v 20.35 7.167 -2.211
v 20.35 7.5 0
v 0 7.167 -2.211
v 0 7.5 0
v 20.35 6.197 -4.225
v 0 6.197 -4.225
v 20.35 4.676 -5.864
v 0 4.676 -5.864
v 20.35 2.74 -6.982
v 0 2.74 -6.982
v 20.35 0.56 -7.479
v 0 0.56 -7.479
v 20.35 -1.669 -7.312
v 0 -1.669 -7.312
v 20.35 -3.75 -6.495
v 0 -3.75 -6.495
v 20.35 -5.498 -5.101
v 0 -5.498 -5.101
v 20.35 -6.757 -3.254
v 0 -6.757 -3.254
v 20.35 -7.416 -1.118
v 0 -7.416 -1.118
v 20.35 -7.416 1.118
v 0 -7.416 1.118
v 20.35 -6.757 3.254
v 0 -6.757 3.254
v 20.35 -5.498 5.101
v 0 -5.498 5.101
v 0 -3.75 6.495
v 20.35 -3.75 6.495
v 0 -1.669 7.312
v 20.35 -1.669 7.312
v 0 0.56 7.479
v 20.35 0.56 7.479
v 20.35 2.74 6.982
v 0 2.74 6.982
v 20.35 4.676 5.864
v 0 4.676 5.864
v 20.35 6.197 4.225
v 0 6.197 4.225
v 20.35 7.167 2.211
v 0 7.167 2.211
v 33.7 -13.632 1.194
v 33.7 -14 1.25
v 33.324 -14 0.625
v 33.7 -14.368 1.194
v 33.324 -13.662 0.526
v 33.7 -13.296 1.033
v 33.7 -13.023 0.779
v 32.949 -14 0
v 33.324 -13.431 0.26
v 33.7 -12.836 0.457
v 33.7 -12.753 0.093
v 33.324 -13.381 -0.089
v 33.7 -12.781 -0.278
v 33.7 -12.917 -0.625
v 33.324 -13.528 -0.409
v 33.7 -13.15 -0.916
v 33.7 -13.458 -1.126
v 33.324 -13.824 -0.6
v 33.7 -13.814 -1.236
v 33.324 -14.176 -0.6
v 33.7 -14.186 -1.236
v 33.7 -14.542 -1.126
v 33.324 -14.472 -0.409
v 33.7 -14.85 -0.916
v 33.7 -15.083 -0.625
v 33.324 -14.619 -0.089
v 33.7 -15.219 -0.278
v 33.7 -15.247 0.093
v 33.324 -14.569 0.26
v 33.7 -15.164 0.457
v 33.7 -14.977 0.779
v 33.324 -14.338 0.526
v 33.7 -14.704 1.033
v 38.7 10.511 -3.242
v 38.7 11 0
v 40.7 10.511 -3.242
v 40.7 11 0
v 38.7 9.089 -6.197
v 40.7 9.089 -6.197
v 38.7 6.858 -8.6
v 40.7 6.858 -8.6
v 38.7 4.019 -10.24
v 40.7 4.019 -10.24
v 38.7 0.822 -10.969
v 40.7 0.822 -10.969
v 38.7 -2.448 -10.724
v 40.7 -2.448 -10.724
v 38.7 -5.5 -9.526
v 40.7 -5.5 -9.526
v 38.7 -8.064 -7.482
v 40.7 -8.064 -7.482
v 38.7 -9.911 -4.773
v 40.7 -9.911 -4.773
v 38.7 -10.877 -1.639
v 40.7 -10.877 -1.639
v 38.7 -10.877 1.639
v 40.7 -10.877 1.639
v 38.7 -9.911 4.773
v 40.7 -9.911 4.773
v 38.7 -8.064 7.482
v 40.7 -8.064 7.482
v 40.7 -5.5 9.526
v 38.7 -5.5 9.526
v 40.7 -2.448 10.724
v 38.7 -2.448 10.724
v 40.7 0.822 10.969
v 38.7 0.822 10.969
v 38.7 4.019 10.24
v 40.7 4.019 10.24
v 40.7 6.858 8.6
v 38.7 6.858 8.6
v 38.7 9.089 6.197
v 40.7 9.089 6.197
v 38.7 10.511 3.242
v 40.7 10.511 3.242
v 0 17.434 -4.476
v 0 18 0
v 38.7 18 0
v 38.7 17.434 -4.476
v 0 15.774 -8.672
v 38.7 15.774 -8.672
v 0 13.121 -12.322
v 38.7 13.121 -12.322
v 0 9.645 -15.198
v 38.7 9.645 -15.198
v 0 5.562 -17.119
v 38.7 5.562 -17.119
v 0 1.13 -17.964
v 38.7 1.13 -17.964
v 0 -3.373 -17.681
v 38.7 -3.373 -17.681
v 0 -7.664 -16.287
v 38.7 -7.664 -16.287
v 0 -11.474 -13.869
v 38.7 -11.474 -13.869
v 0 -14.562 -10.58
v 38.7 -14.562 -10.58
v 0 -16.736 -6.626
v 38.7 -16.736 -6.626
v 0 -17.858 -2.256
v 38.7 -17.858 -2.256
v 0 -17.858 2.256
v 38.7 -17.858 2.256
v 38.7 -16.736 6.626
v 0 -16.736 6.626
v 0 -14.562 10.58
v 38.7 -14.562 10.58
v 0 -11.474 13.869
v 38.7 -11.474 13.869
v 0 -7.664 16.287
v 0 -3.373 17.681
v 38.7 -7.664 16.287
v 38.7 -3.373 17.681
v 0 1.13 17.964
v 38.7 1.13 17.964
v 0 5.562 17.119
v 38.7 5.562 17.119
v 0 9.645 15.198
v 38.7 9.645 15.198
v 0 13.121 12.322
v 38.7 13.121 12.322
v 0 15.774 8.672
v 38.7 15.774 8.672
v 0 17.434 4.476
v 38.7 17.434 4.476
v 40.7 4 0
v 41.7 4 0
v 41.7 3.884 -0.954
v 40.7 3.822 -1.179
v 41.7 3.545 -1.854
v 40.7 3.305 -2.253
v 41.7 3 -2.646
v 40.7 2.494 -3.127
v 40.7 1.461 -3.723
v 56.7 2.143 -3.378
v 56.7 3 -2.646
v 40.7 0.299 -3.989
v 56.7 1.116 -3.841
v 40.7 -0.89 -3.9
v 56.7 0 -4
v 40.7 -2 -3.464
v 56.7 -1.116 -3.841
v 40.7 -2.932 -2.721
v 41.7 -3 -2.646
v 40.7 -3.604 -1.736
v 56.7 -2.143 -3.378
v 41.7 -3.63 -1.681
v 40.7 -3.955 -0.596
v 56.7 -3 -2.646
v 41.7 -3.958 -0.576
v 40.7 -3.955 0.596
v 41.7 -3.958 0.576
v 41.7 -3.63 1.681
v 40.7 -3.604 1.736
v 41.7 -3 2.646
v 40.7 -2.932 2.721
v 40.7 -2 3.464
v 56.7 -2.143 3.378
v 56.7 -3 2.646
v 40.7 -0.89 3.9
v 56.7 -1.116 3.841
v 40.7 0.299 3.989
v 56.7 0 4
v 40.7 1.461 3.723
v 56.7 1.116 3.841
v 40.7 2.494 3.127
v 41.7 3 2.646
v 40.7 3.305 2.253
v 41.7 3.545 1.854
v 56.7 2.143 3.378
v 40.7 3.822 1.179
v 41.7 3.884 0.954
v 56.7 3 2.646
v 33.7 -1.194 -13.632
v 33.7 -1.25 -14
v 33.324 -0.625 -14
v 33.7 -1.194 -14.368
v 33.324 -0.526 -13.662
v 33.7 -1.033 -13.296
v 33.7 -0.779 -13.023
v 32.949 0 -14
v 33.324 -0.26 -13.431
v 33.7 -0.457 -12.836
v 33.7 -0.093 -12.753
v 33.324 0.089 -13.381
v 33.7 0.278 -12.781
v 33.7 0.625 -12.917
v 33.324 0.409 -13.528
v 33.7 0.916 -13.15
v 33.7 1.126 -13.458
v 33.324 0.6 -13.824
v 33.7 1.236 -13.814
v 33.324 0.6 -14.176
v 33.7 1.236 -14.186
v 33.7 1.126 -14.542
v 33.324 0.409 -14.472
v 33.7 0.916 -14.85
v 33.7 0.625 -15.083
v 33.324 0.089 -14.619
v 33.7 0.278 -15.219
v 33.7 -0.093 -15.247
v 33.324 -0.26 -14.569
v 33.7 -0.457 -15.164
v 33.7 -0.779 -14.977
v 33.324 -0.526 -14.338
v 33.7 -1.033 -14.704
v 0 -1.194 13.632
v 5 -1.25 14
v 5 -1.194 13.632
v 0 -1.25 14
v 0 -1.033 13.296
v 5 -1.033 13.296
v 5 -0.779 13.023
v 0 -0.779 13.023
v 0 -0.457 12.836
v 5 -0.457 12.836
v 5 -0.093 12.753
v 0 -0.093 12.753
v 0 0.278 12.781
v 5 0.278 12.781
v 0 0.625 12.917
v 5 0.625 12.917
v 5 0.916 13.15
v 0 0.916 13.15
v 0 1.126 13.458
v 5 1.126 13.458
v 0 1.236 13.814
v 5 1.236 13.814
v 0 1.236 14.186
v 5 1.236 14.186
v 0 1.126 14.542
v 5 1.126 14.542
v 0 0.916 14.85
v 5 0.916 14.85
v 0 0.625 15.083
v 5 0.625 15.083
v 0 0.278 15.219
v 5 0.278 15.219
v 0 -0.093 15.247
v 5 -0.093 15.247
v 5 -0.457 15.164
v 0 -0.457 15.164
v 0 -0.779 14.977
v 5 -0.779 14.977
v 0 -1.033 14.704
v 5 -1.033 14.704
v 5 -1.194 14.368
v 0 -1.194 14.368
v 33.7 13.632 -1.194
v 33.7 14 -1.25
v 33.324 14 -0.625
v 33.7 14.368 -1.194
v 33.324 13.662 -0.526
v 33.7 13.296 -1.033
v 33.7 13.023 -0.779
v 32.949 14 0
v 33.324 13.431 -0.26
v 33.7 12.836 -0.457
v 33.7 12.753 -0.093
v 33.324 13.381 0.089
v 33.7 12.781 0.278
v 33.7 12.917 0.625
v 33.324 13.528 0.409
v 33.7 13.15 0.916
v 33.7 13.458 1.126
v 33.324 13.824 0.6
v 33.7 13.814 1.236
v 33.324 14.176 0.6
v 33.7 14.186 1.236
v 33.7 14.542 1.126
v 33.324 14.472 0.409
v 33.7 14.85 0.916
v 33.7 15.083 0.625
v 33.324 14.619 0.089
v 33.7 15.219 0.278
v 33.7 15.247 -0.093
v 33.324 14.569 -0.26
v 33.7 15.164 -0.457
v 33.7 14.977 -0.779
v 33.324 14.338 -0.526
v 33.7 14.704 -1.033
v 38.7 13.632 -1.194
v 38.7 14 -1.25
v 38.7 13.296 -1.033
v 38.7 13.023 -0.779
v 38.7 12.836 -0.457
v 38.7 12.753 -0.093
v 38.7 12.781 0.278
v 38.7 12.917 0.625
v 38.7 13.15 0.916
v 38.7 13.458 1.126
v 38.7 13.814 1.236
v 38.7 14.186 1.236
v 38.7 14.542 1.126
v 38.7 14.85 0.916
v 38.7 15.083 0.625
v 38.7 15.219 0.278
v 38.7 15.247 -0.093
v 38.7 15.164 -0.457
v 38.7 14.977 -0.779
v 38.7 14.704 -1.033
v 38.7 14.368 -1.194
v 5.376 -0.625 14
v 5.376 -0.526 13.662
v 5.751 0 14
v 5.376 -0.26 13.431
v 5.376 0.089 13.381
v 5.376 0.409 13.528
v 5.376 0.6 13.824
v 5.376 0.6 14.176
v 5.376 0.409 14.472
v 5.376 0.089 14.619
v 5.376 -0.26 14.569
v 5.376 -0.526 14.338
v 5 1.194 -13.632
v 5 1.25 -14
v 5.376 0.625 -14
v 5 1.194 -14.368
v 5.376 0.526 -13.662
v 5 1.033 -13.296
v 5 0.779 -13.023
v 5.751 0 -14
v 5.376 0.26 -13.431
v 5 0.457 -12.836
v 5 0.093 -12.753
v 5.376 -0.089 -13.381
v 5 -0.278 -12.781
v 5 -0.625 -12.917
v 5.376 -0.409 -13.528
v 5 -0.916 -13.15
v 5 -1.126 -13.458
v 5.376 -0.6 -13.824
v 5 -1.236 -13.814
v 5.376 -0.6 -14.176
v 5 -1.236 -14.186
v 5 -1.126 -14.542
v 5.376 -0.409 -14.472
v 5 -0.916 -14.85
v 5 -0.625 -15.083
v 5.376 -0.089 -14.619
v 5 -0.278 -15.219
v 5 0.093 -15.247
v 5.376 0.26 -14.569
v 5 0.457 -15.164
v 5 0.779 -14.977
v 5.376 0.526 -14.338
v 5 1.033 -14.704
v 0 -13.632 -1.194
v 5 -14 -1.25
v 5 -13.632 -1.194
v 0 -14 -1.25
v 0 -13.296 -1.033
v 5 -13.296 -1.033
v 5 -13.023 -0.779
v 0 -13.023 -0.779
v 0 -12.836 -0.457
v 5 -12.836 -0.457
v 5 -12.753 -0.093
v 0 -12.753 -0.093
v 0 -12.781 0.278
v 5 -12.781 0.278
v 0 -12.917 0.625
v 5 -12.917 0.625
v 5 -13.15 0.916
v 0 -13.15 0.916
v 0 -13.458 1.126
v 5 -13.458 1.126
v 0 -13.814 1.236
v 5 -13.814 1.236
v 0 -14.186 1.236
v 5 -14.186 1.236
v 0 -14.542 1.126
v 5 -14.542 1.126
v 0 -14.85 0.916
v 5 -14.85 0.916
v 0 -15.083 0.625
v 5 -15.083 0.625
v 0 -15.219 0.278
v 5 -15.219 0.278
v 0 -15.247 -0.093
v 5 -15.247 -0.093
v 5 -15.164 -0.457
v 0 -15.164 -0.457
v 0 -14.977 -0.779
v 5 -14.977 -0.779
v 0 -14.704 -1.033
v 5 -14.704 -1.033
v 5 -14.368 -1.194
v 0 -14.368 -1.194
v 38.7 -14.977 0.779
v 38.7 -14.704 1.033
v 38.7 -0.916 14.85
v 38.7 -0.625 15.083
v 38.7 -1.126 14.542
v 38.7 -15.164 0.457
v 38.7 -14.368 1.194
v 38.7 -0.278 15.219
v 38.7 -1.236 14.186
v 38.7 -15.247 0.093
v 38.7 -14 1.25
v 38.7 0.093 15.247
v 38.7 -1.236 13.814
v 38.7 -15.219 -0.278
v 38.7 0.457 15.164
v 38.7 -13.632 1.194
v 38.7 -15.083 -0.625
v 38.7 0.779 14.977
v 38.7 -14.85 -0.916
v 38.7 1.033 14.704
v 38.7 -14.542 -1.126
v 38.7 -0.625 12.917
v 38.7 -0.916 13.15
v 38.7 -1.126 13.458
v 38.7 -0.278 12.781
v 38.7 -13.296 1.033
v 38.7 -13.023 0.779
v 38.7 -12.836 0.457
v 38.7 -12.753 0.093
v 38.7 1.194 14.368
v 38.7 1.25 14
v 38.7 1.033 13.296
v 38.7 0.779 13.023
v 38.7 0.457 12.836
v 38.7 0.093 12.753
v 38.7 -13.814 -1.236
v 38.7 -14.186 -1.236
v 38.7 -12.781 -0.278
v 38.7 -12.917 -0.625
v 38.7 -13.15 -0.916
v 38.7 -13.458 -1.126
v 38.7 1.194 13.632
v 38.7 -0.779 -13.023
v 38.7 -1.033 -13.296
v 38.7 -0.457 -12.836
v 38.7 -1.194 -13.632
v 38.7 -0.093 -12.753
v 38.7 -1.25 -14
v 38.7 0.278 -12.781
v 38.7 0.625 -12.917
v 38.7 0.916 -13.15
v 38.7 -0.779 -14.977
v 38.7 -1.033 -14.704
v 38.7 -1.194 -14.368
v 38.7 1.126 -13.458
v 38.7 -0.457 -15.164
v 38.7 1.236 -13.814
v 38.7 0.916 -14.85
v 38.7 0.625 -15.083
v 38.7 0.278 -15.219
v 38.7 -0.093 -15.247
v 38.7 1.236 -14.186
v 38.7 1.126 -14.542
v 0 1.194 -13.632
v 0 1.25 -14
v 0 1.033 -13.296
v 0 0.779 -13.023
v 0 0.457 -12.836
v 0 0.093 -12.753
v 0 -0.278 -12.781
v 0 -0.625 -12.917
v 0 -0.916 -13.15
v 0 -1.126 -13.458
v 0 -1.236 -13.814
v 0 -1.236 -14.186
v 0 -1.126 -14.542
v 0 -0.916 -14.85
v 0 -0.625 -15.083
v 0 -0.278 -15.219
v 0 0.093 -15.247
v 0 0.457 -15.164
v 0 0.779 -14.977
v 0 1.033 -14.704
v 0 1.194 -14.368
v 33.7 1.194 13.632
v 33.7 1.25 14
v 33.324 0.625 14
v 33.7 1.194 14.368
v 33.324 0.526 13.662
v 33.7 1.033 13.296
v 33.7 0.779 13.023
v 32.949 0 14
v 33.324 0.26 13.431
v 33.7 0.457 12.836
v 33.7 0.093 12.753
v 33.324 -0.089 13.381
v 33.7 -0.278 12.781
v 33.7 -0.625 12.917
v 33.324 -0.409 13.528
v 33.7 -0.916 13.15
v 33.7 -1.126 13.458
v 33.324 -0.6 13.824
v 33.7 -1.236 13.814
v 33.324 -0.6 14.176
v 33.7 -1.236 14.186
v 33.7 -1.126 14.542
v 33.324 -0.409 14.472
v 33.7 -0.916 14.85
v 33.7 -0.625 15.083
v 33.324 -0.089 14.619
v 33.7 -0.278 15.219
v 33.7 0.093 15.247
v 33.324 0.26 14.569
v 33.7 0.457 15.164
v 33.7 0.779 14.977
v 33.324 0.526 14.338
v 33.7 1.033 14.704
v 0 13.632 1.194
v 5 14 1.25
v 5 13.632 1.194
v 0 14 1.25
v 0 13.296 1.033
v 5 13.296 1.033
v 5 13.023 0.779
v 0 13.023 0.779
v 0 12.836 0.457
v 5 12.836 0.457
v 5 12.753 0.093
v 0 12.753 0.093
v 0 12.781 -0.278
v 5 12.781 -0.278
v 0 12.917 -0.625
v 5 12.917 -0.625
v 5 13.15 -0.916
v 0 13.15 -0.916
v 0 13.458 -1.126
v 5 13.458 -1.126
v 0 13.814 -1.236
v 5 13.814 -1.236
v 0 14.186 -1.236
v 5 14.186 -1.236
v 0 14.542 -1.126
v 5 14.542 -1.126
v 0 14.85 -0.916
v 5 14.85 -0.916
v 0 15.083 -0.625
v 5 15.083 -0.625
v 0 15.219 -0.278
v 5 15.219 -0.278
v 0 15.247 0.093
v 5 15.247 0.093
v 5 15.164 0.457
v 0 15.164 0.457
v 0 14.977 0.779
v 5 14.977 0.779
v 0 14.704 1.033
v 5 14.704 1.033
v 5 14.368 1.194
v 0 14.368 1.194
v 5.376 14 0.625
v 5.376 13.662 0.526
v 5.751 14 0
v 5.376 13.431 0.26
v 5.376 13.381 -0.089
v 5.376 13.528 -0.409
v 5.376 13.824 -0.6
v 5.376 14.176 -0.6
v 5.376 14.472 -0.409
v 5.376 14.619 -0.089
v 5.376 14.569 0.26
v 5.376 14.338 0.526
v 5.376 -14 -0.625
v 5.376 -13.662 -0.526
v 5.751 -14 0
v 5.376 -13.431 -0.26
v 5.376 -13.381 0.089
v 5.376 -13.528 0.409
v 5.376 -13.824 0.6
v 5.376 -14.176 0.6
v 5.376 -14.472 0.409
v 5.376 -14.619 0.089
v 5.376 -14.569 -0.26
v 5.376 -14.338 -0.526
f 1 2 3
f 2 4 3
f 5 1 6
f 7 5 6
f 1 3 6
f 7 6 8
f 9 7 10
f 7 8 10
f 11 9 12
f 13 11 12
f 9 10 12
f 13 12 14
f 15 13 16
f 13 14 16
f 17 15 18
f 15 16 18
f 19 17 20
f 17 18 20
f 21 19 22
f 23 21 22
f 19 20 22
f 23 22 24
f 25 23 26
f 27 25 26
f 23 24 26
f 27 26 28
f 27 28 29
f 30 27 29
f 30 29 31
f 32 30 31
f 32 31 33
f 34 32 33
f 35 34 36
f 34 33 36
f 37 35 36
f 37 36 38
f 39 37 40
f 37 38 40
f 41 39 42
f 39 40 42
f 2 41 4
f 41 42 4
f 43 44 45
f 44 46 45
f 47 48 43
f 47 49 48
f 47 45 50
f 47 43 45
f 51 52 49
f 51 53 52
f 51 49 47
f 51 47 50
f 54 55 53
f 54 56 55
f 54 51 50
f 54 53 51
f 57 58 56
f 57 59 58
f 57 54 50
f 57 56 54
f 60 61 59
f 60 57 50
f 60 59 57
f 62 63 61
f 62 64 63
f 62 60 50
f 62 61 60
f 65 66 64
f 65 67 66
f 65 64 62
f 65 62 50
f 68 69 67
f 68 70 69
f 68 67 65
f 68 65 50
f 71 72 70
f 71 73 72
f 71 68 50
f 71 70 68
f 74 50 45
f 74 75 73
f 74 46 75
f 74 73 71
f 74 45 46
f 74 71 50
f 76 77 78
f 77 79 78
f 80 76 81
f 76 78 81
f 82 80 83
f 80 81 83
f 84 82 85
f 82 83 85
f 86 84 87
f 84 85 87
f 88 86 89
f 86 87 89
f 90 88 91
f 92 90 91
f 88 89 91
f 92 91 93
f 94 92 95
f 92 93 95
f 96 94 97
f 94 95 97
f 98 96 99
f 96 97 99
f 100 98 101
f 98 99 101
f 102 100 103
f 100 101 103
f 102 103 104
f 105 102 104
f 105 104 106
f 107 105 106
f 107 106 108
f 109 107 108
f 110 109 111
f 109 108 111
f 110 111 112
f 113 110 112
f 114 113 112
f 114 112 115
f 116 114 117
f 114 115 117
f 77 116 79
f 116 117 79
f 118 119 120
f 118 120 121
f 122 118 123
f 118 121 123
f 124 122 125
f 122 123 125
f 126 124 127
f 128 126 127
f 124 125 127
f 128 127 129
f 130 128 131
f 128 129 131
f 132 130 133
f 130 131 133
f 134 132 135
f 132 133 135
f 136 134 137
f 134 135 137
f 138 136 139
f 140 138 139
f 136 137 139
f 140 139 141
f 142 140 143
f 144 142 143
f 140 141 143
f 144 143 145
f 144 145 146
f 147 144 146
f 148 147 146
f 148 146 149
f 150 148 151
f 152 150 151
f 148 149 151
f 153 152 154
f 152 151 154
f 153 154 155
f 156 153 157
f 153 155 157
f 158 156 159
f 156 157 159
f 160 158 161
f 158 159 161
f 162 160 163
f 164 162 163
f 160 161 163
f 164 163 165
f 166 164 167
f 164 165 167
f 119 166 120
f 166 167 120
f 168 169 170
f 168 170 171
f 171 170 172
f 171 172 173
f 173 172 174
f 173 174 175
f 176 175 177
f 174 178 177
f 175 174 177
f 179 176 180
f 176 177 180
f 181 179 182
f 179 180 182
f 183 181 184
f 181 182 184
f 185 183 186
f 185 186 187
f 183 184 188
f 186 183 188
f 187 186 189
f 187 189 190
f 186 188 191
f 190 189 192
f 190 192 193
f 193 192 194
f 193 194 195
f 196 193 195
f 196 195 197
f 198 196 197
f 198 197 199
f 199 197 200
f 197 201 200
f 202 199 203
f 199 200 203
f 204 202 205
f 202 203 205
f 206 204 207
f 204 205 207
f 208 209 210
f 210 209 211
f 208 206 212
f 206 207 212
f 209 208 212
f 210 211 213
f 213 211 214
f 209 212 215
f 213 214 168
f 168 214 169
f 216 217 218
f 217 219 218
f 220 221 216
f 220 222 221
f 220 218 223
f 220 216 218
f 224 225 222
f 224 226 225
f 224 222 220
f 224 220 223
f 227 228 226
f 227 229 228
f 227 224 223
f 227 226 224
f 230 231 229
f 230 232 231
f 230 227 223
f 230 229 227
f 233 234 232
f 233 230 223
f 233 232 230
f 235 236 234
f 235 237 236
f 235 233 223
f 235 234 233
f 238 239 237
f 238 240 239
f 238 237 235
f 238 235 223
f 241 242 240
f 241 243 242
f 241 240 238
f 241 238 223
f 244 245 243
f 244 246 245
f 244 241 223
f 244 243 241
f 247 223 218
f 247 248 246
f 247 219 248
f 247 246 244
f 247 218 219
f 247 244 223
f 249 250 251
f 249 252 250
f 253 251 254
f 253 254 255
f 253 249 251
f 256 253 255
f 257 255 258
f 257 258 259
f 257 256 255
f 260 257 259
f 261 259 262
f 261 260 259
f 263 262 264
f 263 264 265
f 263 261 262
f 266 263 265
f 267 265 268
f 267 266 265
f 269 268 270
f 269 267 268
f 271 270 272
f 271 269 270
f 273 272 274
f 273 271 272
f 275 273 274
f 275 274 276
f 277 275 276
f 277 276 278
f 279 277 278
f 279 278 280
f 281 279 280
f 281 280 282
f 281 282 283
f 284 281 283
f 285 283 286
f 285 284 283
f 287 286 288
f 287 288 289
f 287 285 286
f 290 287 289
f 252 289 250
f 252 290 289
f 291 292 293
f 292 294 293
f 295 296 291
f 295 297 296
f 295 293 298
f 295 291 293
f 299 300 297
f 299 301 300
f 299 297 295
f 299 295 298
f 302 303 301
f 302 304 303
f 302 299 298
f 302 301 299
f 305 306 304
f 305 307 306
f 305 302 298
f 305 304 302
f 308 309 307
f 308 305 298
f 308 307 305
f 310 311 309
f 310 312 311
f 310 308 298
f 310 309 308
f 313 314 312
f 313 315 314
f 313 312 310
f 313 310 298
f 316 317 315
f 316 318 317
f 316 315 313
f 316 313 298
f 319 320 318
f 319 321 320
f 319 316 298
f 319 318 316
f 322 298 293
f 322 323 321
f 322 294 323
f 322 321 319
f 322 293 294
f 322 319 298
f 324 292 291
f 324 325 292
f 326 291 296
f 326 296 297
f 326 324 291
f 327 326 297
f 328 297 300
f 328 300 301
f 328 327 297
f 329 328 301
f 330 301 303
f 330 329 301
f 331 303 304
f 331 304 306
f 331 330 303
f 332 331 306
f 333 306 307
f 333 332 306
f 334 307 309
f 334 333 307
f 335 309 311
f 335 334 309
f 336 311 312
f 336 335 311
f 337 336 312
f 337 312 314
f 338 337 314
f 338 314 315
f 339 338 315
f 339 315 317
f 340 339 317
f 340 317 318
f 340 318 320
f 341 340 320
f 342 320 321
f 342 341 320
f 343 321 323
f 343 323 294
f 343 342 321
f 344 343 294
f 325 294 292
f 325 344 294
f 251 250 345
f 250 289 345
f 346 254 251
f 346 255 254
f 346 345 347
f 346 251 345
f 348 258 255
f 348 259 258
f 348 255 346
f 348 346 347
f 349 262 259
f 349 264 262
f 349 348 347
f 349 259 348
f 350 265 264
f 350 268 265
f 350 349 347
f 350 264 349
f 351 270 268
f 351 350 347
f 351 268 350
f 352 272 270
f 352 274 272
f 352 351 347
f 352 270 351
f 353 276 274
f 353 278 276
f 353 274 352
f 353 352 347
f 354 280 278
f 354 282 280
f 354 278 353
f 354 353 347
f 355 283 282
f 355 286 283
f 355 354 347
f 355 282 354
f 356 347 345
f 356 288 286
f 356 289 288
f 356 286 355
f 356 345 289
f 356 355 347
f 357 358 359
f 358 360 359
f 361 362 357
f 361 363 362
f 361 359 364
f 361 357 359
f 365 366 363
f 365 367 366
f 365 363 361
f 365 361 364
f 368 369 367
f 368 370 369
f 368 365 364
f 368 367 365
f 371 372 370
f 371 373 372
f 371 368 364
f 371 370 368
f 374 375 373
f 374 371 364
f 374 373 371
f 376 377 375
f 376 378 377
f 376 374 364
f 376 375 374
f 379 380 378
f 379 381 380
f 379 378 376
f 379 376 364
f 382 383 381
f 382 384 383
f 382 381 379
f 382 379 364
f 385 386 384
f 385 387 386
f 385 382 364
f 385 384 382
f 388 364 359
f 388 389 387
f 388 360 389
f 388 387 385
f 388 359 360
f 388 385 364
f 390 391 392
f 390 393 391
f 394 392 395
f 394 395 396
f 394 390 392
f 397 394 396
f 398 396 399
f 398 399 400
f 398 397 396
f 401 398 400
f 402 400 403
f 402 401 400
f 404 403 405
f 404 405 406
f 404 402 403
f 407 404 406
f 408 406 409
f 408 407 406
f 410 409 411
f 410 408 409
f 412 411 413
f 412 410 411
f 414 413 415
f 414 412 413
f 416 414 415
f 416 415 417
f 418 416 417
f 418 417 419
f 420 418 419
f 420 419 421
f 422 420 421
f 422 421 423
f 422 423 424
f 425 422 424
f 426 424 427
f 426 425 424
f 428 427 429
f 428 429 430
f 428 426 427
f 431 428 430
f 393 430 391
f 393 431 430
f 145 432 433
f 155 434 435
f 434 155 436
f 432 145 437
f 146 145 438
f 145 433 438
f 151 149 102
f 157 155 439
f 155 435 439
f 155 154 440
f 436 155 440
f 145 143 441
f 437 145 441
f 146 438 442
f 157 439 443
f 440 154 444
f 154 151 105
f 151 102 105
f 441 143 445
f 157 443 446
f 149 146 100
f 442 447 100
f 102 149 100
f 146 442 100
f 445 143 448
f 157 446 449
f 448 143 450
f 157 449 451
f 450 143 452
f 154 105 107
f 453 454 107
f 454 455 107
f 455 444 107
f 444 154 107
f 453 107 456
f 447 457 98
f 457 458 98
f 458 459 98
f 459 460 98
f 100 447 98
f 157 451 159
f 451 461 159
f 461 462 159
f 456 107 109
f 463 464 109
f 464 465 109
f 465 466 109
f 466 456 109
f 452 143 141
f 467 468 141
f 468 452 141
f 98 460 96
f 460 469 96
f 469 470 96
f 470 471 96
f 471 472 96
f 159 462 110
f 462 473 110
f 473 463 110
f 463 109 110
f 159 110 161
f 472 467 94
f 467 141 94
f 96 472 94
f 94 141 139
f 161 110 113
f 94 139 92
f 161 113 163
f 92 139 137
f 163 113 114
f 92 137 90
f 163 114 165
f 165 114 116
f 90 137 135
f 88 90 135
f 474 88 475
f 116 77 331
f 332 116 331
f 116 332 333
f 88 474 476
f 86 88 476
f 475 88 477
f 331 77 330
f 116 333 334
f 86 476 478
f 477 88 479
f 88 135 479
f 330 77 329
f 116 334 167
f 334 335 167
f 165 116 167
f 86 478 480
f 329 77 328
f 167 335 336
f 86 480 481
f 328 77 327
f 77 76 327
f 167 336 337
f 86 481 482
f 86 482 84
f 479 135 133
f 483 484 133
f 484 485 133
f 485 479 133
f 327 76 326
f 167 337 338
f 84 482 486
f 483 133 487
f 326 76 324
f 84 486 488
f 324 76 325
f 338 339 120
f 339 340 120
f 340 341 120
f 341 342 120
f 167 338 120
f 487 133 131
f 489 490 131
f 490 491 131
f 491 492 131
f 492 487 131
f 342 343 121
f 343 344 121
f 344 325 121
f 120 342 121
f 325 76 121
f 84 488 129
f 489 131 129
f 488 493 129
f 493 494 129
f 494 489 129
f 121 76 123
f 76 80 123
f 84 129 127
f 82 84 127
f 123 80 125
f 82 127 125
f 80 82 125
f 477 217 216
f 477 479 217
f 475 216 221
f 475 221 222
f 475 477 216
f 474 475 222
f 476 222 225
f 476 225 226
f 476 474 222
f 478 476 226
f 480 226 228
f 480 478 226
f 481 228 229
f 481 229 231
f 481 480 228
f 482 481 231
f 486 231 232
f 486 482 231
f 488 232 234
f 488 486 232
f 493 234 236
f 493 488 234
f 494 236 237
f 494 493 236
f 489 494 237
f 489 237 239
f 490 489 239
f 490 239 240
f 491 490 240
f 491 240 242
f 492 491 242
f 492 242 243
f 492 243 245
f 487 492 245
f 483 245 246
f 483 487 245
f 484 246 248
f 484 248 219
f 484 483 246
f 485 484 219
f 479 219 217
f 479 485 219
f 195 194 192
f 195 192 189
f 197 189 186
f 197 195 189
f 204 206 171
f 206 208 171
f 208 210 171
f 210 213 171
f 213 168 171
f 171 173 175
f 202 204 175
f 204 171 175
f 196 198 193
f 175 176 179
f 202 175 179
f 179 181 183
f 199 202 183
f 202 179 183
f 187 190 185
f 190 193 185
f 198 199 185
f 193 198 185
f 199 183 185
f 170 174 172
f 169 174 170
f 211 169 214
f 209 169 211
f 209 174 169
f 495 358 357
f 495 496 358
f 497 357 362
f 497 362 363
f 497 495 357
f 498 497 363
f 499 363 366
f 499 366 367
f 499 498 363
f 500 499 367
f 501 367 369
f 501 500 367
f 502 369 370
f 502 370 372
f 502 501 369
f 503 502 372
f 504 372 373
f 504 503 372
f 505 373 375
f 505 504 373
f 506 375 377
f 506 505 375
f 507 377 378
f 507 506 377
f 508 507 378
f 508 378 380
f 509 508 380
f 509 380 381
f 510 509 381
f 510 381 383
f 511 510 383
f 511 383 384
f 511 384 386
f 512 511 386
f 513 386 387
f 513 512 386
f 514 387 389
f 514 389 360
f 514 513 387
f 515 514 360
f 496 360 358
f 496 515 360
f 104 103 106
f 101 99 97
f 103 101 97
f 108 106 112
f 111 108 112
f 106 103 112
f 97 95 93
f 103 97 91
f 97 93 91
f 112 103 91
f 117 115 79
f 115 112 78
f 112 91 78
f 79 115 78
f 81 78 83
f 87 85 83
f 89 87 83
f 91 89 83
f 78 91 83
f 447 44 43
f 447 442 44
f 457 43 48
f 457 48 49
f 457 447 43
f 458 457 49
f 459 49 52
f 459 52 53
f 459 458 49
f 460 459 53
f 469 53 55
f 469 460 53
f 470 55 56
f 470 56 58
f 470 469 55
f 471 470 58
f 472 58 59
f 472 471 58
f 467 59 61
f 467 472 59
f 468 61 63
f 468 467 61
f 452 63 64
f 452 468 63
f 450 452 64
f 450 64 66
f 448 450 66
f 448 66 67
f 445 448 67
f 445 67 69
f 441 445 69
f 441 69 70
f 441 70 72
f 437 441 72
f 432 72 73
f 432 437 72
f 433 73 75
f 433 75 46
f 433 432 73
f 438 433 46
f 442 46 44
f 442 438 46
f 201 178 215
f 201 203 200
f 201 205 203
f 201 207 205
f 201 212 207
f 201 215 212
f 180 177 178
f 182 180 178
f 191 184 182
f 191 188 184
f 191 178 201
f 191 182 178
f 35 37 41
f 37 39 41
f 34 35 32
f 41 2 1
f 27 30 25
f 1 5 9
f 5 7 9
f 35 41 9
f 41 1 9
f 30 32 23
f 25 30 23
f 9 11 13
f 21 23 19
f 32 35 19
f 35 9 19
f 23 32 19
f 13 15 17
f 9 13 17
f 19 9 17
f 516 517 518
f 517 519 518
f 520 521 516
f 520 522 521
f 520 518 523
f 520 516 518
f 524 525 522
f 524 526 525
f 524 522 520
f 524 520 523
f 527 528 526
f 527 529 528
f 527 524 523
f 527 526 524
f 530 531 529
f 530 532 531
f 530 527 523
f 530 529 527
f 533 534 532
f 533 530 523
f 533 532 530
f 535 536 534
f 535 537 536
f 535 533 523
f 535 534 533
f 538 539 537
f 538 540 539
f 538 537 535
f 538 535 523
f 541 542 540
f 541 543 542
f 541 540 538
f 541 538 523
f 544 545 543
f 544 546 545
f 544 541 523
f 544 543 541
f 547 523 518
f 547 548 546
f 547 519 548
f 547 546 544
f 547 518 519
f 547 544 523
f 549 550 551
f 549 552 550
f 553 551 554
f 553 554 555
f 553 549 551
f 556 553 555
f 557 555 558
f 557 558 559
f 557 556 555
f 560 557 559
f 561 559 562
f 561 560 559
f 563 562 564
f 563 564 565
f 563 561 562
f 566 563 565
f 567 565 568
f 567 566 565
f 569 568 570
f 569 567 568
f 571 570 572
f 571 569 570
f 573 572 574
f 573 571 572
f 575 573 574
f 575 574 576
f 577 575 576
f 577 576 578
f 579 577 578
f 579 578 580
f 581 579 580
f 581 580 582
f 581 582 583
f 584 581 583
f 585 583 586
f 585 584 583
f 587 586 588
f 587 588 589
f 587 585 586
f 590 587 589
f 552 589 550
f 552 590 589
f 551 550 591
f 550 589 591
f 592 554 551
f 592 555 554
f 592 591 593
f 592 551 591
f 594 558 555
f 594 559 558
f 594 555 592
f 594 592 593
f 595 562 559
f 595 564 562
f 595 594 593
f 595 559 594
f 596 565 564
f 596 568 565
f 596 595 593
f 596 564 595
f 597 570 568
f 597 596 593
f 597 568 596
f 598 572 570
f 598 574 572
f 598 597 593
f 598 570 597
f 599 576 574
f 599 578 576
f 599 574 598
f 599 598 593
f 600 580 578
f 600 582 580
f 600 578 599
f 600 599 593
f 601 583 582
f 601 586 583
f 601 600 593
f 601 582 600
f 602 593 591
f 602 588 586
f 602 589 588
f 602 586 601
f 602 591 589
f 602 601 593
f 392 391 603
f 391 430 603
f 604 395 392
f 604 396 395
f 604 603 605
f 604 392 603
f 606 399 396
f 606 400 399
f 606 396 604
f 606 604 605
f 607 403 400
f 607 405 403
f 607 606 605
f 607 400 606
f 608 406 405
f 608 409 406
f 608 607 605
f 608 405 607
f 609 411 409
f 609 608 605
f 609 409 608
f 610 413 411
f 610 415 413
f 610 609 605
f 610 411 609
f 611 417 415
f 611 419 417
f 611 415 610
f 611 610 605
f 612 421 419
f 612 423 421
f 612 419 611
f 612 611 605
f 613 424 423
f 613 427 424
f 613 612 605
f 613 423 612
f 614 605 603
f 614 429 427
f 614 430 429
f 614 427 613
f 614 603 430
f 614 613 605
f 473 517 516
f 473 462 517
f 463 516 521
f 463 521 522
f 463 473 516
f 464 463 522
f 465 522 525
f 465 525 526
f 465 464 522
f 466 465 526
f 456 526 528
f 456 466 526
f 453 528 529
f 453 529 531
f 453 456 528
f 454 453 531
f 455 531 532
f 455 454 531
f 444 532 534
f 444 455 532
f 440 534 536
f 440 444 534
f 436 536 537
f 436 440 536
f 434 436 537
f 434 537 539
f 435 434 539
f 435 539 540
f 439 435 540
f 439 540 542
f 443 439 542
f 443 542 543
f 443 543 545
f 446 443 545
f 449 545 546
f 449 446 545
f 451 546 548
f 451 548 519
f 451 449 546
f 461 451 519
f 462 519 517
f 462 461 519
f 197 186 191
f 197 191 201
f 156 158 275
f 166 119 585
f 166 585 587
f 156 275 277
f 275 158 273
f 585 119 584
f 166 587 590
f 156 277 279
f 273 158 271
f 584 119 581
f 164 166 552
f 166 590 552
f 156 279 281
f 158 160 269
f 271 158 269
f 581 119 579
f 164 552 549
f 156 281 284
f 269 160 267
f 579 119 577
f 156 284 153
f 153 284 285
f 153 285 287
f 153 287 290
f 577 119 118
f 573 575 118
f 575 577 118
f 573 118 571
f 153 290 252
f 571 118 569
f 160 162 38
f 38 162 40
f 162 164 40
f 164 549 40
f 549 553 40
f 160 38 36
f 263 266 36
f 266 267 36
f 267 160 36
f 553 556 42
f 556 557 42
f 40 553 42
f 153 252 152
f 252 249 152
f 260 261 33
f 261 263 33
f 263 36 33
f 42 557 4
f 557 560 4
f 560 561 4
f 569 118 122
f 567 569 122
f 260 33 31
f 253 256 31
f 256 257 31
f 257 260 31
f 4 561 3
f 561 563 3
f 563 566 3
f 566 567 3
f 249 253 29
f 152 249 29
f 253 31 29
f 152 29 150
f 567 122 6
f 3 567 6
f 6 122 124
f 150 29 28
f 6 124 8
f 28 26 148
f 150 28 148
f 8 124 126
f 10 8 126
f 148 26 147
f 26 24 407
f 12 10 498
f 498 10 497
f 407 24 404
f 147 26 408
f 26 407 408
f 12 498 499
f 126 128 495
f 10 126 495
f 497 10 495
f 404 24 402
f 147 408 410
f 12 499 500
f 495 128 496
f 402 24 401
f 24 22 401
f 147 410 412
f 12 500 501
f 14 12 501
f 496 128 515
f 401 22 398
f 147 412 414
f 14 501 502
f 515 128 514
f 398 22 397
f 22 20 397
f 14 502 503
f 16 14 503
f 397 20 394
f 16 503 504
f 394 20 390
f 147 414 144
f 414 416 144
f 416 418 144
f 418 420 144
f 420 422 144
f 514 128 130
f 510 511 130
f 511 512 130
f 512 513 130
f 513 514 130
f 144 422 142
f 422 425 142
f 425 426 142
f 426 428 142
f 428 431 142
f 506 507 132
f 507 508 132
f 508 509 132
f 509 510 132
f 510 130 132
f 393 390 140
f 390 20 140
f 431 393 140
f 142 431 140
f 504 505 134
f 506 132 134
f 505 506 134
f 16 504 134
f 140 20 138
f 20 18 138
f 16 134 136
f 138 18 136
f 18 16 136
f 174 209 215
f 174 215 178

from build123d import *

# Parameters (mm, degrees)
SKIZZE3_W                       = 16
SKIZZE3_H                       = 4
SCHNITT_LINEAR_AUSTRAGEN1_DEPTH = 15
SPIEGELN1_START                 = 41.7
SPIEGELN1_DEPTH                 = 15
KREISMUSTER1_COUNT              = 4


# Read off the part's stored shape, not the designer's step: Spiegeln1
with BuildPart() as part:
    # Skizze2 → Rotation1 (revolve)
    with BuildSketch(Plane.XY):
        Polygon((38.7, 18), (38.7, 11), (40.7, 11), (40.7, 0), (20.35, 0), (20.35, 7.5), (0, 7.5), (0, 18), align=None)
    revolve(axis=Axis((40.7, 0, 0), (-1, 0, 0)))

    # Skizze6 → M3 Gewindebohrung1 (revolve, cut)
    with BuildSketch(Plane.ZX.offset(14)):
        Polygon((0, 0), (0, 5.751075774), (1.25, 5), (1.25, 0), align=None)
    m3_gewindebohrung1 = revolve(axis=Axis((-6.35, 14, 0), (1, 0, 0)), mode=Mode.SUBTRACT)

    # Skizze8 → M3 Gewindebohrung2 (revolve, cut)
    with BuildSketch(Plane(origin=(38.7, 14, 0), x_dir=(0, 0, -1), z_dir=(0, 1, 0))):
        Polygon((0, 0), (0, 5.751075774), (1.25, 5), (1.25, 0), align=None)
    m3_gewindebohrung2 = revolve(axis=Axis((45.05, 14, 0), (-1, 0, 0)), mode=Mode.SUBTRACT)

    # Kreismuster1: M3 Gewindebohrung1, M3 Gewindebohrung2 ×4 about axis
    kreismuster1_axis = Axis((0, 0, 0), (1, 0, 0))
    add([m3_gewindebohrung1.rotate(kreismuster1_axis, i * 360 / KREISMUSTER1_COUNT) for i in range(1, KREISMUSTER1_COUNT)], mode=Mode.SUBTRACT)
    add([m3_gewindebohrung2.rotate(kreismuster1_axis, i * 360 / KREISMUSTER1_COUNT) for i in range(1, KREISMUSTER1_COUNT)], mode=Mode.SUBTRACT)


with BuildPart() as body_2:
    # Skizze3 → Rotation2 (revolve)
    with BuildSketch(Plane.XY):
        with Locations((48.7, 2)):
            Rectangle(SKIZZE3_W, SKIZZE3_H)
    revolve(axis=Axis((56.7, 0, 0), (-1, 0, 0)))

    # Skizze4 → Schnitt-Linear austragen1 (cut)
    with BuildSketch(Plane(origin=(56.7, 0, 0), x_dir=(0, 0, -1), z_dir=(1, 0, 0))):
        with BuildLine():
            Line((-2.645751311, 3), (0, 3))
            Line((0, 3), (0, 4))
            ThreePointArc((0, 4), (-1.414213562, 3.741657387), (-2.645751311, 3))
        make_face()
    extrude(amount=-SCHNITT_LINEAR_AUSTRAGEN1_DEPTH, mode=Mode.SUBTRACT)

    # Spiegeln1 outline → Spiegeln1 (cut)
    with BuildSketch(Plane.YZ.offset(SPIEGELN1_START)):
        with BuildLine():
            Line((4, 0), (3, 0))
            Line((3, 0), (3, -2.645751311))
            ThreePointArc((3, -2.645751311), (3.741657387, -1.414213562), (4, 0))
        make_face()
        with BuildLine():
            Line((-3, -2.645751311), (-3, 2.645751311))
            ThreePointArc((-3, 2.645751311), (-4, 0), (-3, -2.645751311))
        make_face()
    extrude(amount=SPIEGELN1_DEPTH, mode=Mode.SUBTRACT)


solid = Compound([part.part, body_2.part])
